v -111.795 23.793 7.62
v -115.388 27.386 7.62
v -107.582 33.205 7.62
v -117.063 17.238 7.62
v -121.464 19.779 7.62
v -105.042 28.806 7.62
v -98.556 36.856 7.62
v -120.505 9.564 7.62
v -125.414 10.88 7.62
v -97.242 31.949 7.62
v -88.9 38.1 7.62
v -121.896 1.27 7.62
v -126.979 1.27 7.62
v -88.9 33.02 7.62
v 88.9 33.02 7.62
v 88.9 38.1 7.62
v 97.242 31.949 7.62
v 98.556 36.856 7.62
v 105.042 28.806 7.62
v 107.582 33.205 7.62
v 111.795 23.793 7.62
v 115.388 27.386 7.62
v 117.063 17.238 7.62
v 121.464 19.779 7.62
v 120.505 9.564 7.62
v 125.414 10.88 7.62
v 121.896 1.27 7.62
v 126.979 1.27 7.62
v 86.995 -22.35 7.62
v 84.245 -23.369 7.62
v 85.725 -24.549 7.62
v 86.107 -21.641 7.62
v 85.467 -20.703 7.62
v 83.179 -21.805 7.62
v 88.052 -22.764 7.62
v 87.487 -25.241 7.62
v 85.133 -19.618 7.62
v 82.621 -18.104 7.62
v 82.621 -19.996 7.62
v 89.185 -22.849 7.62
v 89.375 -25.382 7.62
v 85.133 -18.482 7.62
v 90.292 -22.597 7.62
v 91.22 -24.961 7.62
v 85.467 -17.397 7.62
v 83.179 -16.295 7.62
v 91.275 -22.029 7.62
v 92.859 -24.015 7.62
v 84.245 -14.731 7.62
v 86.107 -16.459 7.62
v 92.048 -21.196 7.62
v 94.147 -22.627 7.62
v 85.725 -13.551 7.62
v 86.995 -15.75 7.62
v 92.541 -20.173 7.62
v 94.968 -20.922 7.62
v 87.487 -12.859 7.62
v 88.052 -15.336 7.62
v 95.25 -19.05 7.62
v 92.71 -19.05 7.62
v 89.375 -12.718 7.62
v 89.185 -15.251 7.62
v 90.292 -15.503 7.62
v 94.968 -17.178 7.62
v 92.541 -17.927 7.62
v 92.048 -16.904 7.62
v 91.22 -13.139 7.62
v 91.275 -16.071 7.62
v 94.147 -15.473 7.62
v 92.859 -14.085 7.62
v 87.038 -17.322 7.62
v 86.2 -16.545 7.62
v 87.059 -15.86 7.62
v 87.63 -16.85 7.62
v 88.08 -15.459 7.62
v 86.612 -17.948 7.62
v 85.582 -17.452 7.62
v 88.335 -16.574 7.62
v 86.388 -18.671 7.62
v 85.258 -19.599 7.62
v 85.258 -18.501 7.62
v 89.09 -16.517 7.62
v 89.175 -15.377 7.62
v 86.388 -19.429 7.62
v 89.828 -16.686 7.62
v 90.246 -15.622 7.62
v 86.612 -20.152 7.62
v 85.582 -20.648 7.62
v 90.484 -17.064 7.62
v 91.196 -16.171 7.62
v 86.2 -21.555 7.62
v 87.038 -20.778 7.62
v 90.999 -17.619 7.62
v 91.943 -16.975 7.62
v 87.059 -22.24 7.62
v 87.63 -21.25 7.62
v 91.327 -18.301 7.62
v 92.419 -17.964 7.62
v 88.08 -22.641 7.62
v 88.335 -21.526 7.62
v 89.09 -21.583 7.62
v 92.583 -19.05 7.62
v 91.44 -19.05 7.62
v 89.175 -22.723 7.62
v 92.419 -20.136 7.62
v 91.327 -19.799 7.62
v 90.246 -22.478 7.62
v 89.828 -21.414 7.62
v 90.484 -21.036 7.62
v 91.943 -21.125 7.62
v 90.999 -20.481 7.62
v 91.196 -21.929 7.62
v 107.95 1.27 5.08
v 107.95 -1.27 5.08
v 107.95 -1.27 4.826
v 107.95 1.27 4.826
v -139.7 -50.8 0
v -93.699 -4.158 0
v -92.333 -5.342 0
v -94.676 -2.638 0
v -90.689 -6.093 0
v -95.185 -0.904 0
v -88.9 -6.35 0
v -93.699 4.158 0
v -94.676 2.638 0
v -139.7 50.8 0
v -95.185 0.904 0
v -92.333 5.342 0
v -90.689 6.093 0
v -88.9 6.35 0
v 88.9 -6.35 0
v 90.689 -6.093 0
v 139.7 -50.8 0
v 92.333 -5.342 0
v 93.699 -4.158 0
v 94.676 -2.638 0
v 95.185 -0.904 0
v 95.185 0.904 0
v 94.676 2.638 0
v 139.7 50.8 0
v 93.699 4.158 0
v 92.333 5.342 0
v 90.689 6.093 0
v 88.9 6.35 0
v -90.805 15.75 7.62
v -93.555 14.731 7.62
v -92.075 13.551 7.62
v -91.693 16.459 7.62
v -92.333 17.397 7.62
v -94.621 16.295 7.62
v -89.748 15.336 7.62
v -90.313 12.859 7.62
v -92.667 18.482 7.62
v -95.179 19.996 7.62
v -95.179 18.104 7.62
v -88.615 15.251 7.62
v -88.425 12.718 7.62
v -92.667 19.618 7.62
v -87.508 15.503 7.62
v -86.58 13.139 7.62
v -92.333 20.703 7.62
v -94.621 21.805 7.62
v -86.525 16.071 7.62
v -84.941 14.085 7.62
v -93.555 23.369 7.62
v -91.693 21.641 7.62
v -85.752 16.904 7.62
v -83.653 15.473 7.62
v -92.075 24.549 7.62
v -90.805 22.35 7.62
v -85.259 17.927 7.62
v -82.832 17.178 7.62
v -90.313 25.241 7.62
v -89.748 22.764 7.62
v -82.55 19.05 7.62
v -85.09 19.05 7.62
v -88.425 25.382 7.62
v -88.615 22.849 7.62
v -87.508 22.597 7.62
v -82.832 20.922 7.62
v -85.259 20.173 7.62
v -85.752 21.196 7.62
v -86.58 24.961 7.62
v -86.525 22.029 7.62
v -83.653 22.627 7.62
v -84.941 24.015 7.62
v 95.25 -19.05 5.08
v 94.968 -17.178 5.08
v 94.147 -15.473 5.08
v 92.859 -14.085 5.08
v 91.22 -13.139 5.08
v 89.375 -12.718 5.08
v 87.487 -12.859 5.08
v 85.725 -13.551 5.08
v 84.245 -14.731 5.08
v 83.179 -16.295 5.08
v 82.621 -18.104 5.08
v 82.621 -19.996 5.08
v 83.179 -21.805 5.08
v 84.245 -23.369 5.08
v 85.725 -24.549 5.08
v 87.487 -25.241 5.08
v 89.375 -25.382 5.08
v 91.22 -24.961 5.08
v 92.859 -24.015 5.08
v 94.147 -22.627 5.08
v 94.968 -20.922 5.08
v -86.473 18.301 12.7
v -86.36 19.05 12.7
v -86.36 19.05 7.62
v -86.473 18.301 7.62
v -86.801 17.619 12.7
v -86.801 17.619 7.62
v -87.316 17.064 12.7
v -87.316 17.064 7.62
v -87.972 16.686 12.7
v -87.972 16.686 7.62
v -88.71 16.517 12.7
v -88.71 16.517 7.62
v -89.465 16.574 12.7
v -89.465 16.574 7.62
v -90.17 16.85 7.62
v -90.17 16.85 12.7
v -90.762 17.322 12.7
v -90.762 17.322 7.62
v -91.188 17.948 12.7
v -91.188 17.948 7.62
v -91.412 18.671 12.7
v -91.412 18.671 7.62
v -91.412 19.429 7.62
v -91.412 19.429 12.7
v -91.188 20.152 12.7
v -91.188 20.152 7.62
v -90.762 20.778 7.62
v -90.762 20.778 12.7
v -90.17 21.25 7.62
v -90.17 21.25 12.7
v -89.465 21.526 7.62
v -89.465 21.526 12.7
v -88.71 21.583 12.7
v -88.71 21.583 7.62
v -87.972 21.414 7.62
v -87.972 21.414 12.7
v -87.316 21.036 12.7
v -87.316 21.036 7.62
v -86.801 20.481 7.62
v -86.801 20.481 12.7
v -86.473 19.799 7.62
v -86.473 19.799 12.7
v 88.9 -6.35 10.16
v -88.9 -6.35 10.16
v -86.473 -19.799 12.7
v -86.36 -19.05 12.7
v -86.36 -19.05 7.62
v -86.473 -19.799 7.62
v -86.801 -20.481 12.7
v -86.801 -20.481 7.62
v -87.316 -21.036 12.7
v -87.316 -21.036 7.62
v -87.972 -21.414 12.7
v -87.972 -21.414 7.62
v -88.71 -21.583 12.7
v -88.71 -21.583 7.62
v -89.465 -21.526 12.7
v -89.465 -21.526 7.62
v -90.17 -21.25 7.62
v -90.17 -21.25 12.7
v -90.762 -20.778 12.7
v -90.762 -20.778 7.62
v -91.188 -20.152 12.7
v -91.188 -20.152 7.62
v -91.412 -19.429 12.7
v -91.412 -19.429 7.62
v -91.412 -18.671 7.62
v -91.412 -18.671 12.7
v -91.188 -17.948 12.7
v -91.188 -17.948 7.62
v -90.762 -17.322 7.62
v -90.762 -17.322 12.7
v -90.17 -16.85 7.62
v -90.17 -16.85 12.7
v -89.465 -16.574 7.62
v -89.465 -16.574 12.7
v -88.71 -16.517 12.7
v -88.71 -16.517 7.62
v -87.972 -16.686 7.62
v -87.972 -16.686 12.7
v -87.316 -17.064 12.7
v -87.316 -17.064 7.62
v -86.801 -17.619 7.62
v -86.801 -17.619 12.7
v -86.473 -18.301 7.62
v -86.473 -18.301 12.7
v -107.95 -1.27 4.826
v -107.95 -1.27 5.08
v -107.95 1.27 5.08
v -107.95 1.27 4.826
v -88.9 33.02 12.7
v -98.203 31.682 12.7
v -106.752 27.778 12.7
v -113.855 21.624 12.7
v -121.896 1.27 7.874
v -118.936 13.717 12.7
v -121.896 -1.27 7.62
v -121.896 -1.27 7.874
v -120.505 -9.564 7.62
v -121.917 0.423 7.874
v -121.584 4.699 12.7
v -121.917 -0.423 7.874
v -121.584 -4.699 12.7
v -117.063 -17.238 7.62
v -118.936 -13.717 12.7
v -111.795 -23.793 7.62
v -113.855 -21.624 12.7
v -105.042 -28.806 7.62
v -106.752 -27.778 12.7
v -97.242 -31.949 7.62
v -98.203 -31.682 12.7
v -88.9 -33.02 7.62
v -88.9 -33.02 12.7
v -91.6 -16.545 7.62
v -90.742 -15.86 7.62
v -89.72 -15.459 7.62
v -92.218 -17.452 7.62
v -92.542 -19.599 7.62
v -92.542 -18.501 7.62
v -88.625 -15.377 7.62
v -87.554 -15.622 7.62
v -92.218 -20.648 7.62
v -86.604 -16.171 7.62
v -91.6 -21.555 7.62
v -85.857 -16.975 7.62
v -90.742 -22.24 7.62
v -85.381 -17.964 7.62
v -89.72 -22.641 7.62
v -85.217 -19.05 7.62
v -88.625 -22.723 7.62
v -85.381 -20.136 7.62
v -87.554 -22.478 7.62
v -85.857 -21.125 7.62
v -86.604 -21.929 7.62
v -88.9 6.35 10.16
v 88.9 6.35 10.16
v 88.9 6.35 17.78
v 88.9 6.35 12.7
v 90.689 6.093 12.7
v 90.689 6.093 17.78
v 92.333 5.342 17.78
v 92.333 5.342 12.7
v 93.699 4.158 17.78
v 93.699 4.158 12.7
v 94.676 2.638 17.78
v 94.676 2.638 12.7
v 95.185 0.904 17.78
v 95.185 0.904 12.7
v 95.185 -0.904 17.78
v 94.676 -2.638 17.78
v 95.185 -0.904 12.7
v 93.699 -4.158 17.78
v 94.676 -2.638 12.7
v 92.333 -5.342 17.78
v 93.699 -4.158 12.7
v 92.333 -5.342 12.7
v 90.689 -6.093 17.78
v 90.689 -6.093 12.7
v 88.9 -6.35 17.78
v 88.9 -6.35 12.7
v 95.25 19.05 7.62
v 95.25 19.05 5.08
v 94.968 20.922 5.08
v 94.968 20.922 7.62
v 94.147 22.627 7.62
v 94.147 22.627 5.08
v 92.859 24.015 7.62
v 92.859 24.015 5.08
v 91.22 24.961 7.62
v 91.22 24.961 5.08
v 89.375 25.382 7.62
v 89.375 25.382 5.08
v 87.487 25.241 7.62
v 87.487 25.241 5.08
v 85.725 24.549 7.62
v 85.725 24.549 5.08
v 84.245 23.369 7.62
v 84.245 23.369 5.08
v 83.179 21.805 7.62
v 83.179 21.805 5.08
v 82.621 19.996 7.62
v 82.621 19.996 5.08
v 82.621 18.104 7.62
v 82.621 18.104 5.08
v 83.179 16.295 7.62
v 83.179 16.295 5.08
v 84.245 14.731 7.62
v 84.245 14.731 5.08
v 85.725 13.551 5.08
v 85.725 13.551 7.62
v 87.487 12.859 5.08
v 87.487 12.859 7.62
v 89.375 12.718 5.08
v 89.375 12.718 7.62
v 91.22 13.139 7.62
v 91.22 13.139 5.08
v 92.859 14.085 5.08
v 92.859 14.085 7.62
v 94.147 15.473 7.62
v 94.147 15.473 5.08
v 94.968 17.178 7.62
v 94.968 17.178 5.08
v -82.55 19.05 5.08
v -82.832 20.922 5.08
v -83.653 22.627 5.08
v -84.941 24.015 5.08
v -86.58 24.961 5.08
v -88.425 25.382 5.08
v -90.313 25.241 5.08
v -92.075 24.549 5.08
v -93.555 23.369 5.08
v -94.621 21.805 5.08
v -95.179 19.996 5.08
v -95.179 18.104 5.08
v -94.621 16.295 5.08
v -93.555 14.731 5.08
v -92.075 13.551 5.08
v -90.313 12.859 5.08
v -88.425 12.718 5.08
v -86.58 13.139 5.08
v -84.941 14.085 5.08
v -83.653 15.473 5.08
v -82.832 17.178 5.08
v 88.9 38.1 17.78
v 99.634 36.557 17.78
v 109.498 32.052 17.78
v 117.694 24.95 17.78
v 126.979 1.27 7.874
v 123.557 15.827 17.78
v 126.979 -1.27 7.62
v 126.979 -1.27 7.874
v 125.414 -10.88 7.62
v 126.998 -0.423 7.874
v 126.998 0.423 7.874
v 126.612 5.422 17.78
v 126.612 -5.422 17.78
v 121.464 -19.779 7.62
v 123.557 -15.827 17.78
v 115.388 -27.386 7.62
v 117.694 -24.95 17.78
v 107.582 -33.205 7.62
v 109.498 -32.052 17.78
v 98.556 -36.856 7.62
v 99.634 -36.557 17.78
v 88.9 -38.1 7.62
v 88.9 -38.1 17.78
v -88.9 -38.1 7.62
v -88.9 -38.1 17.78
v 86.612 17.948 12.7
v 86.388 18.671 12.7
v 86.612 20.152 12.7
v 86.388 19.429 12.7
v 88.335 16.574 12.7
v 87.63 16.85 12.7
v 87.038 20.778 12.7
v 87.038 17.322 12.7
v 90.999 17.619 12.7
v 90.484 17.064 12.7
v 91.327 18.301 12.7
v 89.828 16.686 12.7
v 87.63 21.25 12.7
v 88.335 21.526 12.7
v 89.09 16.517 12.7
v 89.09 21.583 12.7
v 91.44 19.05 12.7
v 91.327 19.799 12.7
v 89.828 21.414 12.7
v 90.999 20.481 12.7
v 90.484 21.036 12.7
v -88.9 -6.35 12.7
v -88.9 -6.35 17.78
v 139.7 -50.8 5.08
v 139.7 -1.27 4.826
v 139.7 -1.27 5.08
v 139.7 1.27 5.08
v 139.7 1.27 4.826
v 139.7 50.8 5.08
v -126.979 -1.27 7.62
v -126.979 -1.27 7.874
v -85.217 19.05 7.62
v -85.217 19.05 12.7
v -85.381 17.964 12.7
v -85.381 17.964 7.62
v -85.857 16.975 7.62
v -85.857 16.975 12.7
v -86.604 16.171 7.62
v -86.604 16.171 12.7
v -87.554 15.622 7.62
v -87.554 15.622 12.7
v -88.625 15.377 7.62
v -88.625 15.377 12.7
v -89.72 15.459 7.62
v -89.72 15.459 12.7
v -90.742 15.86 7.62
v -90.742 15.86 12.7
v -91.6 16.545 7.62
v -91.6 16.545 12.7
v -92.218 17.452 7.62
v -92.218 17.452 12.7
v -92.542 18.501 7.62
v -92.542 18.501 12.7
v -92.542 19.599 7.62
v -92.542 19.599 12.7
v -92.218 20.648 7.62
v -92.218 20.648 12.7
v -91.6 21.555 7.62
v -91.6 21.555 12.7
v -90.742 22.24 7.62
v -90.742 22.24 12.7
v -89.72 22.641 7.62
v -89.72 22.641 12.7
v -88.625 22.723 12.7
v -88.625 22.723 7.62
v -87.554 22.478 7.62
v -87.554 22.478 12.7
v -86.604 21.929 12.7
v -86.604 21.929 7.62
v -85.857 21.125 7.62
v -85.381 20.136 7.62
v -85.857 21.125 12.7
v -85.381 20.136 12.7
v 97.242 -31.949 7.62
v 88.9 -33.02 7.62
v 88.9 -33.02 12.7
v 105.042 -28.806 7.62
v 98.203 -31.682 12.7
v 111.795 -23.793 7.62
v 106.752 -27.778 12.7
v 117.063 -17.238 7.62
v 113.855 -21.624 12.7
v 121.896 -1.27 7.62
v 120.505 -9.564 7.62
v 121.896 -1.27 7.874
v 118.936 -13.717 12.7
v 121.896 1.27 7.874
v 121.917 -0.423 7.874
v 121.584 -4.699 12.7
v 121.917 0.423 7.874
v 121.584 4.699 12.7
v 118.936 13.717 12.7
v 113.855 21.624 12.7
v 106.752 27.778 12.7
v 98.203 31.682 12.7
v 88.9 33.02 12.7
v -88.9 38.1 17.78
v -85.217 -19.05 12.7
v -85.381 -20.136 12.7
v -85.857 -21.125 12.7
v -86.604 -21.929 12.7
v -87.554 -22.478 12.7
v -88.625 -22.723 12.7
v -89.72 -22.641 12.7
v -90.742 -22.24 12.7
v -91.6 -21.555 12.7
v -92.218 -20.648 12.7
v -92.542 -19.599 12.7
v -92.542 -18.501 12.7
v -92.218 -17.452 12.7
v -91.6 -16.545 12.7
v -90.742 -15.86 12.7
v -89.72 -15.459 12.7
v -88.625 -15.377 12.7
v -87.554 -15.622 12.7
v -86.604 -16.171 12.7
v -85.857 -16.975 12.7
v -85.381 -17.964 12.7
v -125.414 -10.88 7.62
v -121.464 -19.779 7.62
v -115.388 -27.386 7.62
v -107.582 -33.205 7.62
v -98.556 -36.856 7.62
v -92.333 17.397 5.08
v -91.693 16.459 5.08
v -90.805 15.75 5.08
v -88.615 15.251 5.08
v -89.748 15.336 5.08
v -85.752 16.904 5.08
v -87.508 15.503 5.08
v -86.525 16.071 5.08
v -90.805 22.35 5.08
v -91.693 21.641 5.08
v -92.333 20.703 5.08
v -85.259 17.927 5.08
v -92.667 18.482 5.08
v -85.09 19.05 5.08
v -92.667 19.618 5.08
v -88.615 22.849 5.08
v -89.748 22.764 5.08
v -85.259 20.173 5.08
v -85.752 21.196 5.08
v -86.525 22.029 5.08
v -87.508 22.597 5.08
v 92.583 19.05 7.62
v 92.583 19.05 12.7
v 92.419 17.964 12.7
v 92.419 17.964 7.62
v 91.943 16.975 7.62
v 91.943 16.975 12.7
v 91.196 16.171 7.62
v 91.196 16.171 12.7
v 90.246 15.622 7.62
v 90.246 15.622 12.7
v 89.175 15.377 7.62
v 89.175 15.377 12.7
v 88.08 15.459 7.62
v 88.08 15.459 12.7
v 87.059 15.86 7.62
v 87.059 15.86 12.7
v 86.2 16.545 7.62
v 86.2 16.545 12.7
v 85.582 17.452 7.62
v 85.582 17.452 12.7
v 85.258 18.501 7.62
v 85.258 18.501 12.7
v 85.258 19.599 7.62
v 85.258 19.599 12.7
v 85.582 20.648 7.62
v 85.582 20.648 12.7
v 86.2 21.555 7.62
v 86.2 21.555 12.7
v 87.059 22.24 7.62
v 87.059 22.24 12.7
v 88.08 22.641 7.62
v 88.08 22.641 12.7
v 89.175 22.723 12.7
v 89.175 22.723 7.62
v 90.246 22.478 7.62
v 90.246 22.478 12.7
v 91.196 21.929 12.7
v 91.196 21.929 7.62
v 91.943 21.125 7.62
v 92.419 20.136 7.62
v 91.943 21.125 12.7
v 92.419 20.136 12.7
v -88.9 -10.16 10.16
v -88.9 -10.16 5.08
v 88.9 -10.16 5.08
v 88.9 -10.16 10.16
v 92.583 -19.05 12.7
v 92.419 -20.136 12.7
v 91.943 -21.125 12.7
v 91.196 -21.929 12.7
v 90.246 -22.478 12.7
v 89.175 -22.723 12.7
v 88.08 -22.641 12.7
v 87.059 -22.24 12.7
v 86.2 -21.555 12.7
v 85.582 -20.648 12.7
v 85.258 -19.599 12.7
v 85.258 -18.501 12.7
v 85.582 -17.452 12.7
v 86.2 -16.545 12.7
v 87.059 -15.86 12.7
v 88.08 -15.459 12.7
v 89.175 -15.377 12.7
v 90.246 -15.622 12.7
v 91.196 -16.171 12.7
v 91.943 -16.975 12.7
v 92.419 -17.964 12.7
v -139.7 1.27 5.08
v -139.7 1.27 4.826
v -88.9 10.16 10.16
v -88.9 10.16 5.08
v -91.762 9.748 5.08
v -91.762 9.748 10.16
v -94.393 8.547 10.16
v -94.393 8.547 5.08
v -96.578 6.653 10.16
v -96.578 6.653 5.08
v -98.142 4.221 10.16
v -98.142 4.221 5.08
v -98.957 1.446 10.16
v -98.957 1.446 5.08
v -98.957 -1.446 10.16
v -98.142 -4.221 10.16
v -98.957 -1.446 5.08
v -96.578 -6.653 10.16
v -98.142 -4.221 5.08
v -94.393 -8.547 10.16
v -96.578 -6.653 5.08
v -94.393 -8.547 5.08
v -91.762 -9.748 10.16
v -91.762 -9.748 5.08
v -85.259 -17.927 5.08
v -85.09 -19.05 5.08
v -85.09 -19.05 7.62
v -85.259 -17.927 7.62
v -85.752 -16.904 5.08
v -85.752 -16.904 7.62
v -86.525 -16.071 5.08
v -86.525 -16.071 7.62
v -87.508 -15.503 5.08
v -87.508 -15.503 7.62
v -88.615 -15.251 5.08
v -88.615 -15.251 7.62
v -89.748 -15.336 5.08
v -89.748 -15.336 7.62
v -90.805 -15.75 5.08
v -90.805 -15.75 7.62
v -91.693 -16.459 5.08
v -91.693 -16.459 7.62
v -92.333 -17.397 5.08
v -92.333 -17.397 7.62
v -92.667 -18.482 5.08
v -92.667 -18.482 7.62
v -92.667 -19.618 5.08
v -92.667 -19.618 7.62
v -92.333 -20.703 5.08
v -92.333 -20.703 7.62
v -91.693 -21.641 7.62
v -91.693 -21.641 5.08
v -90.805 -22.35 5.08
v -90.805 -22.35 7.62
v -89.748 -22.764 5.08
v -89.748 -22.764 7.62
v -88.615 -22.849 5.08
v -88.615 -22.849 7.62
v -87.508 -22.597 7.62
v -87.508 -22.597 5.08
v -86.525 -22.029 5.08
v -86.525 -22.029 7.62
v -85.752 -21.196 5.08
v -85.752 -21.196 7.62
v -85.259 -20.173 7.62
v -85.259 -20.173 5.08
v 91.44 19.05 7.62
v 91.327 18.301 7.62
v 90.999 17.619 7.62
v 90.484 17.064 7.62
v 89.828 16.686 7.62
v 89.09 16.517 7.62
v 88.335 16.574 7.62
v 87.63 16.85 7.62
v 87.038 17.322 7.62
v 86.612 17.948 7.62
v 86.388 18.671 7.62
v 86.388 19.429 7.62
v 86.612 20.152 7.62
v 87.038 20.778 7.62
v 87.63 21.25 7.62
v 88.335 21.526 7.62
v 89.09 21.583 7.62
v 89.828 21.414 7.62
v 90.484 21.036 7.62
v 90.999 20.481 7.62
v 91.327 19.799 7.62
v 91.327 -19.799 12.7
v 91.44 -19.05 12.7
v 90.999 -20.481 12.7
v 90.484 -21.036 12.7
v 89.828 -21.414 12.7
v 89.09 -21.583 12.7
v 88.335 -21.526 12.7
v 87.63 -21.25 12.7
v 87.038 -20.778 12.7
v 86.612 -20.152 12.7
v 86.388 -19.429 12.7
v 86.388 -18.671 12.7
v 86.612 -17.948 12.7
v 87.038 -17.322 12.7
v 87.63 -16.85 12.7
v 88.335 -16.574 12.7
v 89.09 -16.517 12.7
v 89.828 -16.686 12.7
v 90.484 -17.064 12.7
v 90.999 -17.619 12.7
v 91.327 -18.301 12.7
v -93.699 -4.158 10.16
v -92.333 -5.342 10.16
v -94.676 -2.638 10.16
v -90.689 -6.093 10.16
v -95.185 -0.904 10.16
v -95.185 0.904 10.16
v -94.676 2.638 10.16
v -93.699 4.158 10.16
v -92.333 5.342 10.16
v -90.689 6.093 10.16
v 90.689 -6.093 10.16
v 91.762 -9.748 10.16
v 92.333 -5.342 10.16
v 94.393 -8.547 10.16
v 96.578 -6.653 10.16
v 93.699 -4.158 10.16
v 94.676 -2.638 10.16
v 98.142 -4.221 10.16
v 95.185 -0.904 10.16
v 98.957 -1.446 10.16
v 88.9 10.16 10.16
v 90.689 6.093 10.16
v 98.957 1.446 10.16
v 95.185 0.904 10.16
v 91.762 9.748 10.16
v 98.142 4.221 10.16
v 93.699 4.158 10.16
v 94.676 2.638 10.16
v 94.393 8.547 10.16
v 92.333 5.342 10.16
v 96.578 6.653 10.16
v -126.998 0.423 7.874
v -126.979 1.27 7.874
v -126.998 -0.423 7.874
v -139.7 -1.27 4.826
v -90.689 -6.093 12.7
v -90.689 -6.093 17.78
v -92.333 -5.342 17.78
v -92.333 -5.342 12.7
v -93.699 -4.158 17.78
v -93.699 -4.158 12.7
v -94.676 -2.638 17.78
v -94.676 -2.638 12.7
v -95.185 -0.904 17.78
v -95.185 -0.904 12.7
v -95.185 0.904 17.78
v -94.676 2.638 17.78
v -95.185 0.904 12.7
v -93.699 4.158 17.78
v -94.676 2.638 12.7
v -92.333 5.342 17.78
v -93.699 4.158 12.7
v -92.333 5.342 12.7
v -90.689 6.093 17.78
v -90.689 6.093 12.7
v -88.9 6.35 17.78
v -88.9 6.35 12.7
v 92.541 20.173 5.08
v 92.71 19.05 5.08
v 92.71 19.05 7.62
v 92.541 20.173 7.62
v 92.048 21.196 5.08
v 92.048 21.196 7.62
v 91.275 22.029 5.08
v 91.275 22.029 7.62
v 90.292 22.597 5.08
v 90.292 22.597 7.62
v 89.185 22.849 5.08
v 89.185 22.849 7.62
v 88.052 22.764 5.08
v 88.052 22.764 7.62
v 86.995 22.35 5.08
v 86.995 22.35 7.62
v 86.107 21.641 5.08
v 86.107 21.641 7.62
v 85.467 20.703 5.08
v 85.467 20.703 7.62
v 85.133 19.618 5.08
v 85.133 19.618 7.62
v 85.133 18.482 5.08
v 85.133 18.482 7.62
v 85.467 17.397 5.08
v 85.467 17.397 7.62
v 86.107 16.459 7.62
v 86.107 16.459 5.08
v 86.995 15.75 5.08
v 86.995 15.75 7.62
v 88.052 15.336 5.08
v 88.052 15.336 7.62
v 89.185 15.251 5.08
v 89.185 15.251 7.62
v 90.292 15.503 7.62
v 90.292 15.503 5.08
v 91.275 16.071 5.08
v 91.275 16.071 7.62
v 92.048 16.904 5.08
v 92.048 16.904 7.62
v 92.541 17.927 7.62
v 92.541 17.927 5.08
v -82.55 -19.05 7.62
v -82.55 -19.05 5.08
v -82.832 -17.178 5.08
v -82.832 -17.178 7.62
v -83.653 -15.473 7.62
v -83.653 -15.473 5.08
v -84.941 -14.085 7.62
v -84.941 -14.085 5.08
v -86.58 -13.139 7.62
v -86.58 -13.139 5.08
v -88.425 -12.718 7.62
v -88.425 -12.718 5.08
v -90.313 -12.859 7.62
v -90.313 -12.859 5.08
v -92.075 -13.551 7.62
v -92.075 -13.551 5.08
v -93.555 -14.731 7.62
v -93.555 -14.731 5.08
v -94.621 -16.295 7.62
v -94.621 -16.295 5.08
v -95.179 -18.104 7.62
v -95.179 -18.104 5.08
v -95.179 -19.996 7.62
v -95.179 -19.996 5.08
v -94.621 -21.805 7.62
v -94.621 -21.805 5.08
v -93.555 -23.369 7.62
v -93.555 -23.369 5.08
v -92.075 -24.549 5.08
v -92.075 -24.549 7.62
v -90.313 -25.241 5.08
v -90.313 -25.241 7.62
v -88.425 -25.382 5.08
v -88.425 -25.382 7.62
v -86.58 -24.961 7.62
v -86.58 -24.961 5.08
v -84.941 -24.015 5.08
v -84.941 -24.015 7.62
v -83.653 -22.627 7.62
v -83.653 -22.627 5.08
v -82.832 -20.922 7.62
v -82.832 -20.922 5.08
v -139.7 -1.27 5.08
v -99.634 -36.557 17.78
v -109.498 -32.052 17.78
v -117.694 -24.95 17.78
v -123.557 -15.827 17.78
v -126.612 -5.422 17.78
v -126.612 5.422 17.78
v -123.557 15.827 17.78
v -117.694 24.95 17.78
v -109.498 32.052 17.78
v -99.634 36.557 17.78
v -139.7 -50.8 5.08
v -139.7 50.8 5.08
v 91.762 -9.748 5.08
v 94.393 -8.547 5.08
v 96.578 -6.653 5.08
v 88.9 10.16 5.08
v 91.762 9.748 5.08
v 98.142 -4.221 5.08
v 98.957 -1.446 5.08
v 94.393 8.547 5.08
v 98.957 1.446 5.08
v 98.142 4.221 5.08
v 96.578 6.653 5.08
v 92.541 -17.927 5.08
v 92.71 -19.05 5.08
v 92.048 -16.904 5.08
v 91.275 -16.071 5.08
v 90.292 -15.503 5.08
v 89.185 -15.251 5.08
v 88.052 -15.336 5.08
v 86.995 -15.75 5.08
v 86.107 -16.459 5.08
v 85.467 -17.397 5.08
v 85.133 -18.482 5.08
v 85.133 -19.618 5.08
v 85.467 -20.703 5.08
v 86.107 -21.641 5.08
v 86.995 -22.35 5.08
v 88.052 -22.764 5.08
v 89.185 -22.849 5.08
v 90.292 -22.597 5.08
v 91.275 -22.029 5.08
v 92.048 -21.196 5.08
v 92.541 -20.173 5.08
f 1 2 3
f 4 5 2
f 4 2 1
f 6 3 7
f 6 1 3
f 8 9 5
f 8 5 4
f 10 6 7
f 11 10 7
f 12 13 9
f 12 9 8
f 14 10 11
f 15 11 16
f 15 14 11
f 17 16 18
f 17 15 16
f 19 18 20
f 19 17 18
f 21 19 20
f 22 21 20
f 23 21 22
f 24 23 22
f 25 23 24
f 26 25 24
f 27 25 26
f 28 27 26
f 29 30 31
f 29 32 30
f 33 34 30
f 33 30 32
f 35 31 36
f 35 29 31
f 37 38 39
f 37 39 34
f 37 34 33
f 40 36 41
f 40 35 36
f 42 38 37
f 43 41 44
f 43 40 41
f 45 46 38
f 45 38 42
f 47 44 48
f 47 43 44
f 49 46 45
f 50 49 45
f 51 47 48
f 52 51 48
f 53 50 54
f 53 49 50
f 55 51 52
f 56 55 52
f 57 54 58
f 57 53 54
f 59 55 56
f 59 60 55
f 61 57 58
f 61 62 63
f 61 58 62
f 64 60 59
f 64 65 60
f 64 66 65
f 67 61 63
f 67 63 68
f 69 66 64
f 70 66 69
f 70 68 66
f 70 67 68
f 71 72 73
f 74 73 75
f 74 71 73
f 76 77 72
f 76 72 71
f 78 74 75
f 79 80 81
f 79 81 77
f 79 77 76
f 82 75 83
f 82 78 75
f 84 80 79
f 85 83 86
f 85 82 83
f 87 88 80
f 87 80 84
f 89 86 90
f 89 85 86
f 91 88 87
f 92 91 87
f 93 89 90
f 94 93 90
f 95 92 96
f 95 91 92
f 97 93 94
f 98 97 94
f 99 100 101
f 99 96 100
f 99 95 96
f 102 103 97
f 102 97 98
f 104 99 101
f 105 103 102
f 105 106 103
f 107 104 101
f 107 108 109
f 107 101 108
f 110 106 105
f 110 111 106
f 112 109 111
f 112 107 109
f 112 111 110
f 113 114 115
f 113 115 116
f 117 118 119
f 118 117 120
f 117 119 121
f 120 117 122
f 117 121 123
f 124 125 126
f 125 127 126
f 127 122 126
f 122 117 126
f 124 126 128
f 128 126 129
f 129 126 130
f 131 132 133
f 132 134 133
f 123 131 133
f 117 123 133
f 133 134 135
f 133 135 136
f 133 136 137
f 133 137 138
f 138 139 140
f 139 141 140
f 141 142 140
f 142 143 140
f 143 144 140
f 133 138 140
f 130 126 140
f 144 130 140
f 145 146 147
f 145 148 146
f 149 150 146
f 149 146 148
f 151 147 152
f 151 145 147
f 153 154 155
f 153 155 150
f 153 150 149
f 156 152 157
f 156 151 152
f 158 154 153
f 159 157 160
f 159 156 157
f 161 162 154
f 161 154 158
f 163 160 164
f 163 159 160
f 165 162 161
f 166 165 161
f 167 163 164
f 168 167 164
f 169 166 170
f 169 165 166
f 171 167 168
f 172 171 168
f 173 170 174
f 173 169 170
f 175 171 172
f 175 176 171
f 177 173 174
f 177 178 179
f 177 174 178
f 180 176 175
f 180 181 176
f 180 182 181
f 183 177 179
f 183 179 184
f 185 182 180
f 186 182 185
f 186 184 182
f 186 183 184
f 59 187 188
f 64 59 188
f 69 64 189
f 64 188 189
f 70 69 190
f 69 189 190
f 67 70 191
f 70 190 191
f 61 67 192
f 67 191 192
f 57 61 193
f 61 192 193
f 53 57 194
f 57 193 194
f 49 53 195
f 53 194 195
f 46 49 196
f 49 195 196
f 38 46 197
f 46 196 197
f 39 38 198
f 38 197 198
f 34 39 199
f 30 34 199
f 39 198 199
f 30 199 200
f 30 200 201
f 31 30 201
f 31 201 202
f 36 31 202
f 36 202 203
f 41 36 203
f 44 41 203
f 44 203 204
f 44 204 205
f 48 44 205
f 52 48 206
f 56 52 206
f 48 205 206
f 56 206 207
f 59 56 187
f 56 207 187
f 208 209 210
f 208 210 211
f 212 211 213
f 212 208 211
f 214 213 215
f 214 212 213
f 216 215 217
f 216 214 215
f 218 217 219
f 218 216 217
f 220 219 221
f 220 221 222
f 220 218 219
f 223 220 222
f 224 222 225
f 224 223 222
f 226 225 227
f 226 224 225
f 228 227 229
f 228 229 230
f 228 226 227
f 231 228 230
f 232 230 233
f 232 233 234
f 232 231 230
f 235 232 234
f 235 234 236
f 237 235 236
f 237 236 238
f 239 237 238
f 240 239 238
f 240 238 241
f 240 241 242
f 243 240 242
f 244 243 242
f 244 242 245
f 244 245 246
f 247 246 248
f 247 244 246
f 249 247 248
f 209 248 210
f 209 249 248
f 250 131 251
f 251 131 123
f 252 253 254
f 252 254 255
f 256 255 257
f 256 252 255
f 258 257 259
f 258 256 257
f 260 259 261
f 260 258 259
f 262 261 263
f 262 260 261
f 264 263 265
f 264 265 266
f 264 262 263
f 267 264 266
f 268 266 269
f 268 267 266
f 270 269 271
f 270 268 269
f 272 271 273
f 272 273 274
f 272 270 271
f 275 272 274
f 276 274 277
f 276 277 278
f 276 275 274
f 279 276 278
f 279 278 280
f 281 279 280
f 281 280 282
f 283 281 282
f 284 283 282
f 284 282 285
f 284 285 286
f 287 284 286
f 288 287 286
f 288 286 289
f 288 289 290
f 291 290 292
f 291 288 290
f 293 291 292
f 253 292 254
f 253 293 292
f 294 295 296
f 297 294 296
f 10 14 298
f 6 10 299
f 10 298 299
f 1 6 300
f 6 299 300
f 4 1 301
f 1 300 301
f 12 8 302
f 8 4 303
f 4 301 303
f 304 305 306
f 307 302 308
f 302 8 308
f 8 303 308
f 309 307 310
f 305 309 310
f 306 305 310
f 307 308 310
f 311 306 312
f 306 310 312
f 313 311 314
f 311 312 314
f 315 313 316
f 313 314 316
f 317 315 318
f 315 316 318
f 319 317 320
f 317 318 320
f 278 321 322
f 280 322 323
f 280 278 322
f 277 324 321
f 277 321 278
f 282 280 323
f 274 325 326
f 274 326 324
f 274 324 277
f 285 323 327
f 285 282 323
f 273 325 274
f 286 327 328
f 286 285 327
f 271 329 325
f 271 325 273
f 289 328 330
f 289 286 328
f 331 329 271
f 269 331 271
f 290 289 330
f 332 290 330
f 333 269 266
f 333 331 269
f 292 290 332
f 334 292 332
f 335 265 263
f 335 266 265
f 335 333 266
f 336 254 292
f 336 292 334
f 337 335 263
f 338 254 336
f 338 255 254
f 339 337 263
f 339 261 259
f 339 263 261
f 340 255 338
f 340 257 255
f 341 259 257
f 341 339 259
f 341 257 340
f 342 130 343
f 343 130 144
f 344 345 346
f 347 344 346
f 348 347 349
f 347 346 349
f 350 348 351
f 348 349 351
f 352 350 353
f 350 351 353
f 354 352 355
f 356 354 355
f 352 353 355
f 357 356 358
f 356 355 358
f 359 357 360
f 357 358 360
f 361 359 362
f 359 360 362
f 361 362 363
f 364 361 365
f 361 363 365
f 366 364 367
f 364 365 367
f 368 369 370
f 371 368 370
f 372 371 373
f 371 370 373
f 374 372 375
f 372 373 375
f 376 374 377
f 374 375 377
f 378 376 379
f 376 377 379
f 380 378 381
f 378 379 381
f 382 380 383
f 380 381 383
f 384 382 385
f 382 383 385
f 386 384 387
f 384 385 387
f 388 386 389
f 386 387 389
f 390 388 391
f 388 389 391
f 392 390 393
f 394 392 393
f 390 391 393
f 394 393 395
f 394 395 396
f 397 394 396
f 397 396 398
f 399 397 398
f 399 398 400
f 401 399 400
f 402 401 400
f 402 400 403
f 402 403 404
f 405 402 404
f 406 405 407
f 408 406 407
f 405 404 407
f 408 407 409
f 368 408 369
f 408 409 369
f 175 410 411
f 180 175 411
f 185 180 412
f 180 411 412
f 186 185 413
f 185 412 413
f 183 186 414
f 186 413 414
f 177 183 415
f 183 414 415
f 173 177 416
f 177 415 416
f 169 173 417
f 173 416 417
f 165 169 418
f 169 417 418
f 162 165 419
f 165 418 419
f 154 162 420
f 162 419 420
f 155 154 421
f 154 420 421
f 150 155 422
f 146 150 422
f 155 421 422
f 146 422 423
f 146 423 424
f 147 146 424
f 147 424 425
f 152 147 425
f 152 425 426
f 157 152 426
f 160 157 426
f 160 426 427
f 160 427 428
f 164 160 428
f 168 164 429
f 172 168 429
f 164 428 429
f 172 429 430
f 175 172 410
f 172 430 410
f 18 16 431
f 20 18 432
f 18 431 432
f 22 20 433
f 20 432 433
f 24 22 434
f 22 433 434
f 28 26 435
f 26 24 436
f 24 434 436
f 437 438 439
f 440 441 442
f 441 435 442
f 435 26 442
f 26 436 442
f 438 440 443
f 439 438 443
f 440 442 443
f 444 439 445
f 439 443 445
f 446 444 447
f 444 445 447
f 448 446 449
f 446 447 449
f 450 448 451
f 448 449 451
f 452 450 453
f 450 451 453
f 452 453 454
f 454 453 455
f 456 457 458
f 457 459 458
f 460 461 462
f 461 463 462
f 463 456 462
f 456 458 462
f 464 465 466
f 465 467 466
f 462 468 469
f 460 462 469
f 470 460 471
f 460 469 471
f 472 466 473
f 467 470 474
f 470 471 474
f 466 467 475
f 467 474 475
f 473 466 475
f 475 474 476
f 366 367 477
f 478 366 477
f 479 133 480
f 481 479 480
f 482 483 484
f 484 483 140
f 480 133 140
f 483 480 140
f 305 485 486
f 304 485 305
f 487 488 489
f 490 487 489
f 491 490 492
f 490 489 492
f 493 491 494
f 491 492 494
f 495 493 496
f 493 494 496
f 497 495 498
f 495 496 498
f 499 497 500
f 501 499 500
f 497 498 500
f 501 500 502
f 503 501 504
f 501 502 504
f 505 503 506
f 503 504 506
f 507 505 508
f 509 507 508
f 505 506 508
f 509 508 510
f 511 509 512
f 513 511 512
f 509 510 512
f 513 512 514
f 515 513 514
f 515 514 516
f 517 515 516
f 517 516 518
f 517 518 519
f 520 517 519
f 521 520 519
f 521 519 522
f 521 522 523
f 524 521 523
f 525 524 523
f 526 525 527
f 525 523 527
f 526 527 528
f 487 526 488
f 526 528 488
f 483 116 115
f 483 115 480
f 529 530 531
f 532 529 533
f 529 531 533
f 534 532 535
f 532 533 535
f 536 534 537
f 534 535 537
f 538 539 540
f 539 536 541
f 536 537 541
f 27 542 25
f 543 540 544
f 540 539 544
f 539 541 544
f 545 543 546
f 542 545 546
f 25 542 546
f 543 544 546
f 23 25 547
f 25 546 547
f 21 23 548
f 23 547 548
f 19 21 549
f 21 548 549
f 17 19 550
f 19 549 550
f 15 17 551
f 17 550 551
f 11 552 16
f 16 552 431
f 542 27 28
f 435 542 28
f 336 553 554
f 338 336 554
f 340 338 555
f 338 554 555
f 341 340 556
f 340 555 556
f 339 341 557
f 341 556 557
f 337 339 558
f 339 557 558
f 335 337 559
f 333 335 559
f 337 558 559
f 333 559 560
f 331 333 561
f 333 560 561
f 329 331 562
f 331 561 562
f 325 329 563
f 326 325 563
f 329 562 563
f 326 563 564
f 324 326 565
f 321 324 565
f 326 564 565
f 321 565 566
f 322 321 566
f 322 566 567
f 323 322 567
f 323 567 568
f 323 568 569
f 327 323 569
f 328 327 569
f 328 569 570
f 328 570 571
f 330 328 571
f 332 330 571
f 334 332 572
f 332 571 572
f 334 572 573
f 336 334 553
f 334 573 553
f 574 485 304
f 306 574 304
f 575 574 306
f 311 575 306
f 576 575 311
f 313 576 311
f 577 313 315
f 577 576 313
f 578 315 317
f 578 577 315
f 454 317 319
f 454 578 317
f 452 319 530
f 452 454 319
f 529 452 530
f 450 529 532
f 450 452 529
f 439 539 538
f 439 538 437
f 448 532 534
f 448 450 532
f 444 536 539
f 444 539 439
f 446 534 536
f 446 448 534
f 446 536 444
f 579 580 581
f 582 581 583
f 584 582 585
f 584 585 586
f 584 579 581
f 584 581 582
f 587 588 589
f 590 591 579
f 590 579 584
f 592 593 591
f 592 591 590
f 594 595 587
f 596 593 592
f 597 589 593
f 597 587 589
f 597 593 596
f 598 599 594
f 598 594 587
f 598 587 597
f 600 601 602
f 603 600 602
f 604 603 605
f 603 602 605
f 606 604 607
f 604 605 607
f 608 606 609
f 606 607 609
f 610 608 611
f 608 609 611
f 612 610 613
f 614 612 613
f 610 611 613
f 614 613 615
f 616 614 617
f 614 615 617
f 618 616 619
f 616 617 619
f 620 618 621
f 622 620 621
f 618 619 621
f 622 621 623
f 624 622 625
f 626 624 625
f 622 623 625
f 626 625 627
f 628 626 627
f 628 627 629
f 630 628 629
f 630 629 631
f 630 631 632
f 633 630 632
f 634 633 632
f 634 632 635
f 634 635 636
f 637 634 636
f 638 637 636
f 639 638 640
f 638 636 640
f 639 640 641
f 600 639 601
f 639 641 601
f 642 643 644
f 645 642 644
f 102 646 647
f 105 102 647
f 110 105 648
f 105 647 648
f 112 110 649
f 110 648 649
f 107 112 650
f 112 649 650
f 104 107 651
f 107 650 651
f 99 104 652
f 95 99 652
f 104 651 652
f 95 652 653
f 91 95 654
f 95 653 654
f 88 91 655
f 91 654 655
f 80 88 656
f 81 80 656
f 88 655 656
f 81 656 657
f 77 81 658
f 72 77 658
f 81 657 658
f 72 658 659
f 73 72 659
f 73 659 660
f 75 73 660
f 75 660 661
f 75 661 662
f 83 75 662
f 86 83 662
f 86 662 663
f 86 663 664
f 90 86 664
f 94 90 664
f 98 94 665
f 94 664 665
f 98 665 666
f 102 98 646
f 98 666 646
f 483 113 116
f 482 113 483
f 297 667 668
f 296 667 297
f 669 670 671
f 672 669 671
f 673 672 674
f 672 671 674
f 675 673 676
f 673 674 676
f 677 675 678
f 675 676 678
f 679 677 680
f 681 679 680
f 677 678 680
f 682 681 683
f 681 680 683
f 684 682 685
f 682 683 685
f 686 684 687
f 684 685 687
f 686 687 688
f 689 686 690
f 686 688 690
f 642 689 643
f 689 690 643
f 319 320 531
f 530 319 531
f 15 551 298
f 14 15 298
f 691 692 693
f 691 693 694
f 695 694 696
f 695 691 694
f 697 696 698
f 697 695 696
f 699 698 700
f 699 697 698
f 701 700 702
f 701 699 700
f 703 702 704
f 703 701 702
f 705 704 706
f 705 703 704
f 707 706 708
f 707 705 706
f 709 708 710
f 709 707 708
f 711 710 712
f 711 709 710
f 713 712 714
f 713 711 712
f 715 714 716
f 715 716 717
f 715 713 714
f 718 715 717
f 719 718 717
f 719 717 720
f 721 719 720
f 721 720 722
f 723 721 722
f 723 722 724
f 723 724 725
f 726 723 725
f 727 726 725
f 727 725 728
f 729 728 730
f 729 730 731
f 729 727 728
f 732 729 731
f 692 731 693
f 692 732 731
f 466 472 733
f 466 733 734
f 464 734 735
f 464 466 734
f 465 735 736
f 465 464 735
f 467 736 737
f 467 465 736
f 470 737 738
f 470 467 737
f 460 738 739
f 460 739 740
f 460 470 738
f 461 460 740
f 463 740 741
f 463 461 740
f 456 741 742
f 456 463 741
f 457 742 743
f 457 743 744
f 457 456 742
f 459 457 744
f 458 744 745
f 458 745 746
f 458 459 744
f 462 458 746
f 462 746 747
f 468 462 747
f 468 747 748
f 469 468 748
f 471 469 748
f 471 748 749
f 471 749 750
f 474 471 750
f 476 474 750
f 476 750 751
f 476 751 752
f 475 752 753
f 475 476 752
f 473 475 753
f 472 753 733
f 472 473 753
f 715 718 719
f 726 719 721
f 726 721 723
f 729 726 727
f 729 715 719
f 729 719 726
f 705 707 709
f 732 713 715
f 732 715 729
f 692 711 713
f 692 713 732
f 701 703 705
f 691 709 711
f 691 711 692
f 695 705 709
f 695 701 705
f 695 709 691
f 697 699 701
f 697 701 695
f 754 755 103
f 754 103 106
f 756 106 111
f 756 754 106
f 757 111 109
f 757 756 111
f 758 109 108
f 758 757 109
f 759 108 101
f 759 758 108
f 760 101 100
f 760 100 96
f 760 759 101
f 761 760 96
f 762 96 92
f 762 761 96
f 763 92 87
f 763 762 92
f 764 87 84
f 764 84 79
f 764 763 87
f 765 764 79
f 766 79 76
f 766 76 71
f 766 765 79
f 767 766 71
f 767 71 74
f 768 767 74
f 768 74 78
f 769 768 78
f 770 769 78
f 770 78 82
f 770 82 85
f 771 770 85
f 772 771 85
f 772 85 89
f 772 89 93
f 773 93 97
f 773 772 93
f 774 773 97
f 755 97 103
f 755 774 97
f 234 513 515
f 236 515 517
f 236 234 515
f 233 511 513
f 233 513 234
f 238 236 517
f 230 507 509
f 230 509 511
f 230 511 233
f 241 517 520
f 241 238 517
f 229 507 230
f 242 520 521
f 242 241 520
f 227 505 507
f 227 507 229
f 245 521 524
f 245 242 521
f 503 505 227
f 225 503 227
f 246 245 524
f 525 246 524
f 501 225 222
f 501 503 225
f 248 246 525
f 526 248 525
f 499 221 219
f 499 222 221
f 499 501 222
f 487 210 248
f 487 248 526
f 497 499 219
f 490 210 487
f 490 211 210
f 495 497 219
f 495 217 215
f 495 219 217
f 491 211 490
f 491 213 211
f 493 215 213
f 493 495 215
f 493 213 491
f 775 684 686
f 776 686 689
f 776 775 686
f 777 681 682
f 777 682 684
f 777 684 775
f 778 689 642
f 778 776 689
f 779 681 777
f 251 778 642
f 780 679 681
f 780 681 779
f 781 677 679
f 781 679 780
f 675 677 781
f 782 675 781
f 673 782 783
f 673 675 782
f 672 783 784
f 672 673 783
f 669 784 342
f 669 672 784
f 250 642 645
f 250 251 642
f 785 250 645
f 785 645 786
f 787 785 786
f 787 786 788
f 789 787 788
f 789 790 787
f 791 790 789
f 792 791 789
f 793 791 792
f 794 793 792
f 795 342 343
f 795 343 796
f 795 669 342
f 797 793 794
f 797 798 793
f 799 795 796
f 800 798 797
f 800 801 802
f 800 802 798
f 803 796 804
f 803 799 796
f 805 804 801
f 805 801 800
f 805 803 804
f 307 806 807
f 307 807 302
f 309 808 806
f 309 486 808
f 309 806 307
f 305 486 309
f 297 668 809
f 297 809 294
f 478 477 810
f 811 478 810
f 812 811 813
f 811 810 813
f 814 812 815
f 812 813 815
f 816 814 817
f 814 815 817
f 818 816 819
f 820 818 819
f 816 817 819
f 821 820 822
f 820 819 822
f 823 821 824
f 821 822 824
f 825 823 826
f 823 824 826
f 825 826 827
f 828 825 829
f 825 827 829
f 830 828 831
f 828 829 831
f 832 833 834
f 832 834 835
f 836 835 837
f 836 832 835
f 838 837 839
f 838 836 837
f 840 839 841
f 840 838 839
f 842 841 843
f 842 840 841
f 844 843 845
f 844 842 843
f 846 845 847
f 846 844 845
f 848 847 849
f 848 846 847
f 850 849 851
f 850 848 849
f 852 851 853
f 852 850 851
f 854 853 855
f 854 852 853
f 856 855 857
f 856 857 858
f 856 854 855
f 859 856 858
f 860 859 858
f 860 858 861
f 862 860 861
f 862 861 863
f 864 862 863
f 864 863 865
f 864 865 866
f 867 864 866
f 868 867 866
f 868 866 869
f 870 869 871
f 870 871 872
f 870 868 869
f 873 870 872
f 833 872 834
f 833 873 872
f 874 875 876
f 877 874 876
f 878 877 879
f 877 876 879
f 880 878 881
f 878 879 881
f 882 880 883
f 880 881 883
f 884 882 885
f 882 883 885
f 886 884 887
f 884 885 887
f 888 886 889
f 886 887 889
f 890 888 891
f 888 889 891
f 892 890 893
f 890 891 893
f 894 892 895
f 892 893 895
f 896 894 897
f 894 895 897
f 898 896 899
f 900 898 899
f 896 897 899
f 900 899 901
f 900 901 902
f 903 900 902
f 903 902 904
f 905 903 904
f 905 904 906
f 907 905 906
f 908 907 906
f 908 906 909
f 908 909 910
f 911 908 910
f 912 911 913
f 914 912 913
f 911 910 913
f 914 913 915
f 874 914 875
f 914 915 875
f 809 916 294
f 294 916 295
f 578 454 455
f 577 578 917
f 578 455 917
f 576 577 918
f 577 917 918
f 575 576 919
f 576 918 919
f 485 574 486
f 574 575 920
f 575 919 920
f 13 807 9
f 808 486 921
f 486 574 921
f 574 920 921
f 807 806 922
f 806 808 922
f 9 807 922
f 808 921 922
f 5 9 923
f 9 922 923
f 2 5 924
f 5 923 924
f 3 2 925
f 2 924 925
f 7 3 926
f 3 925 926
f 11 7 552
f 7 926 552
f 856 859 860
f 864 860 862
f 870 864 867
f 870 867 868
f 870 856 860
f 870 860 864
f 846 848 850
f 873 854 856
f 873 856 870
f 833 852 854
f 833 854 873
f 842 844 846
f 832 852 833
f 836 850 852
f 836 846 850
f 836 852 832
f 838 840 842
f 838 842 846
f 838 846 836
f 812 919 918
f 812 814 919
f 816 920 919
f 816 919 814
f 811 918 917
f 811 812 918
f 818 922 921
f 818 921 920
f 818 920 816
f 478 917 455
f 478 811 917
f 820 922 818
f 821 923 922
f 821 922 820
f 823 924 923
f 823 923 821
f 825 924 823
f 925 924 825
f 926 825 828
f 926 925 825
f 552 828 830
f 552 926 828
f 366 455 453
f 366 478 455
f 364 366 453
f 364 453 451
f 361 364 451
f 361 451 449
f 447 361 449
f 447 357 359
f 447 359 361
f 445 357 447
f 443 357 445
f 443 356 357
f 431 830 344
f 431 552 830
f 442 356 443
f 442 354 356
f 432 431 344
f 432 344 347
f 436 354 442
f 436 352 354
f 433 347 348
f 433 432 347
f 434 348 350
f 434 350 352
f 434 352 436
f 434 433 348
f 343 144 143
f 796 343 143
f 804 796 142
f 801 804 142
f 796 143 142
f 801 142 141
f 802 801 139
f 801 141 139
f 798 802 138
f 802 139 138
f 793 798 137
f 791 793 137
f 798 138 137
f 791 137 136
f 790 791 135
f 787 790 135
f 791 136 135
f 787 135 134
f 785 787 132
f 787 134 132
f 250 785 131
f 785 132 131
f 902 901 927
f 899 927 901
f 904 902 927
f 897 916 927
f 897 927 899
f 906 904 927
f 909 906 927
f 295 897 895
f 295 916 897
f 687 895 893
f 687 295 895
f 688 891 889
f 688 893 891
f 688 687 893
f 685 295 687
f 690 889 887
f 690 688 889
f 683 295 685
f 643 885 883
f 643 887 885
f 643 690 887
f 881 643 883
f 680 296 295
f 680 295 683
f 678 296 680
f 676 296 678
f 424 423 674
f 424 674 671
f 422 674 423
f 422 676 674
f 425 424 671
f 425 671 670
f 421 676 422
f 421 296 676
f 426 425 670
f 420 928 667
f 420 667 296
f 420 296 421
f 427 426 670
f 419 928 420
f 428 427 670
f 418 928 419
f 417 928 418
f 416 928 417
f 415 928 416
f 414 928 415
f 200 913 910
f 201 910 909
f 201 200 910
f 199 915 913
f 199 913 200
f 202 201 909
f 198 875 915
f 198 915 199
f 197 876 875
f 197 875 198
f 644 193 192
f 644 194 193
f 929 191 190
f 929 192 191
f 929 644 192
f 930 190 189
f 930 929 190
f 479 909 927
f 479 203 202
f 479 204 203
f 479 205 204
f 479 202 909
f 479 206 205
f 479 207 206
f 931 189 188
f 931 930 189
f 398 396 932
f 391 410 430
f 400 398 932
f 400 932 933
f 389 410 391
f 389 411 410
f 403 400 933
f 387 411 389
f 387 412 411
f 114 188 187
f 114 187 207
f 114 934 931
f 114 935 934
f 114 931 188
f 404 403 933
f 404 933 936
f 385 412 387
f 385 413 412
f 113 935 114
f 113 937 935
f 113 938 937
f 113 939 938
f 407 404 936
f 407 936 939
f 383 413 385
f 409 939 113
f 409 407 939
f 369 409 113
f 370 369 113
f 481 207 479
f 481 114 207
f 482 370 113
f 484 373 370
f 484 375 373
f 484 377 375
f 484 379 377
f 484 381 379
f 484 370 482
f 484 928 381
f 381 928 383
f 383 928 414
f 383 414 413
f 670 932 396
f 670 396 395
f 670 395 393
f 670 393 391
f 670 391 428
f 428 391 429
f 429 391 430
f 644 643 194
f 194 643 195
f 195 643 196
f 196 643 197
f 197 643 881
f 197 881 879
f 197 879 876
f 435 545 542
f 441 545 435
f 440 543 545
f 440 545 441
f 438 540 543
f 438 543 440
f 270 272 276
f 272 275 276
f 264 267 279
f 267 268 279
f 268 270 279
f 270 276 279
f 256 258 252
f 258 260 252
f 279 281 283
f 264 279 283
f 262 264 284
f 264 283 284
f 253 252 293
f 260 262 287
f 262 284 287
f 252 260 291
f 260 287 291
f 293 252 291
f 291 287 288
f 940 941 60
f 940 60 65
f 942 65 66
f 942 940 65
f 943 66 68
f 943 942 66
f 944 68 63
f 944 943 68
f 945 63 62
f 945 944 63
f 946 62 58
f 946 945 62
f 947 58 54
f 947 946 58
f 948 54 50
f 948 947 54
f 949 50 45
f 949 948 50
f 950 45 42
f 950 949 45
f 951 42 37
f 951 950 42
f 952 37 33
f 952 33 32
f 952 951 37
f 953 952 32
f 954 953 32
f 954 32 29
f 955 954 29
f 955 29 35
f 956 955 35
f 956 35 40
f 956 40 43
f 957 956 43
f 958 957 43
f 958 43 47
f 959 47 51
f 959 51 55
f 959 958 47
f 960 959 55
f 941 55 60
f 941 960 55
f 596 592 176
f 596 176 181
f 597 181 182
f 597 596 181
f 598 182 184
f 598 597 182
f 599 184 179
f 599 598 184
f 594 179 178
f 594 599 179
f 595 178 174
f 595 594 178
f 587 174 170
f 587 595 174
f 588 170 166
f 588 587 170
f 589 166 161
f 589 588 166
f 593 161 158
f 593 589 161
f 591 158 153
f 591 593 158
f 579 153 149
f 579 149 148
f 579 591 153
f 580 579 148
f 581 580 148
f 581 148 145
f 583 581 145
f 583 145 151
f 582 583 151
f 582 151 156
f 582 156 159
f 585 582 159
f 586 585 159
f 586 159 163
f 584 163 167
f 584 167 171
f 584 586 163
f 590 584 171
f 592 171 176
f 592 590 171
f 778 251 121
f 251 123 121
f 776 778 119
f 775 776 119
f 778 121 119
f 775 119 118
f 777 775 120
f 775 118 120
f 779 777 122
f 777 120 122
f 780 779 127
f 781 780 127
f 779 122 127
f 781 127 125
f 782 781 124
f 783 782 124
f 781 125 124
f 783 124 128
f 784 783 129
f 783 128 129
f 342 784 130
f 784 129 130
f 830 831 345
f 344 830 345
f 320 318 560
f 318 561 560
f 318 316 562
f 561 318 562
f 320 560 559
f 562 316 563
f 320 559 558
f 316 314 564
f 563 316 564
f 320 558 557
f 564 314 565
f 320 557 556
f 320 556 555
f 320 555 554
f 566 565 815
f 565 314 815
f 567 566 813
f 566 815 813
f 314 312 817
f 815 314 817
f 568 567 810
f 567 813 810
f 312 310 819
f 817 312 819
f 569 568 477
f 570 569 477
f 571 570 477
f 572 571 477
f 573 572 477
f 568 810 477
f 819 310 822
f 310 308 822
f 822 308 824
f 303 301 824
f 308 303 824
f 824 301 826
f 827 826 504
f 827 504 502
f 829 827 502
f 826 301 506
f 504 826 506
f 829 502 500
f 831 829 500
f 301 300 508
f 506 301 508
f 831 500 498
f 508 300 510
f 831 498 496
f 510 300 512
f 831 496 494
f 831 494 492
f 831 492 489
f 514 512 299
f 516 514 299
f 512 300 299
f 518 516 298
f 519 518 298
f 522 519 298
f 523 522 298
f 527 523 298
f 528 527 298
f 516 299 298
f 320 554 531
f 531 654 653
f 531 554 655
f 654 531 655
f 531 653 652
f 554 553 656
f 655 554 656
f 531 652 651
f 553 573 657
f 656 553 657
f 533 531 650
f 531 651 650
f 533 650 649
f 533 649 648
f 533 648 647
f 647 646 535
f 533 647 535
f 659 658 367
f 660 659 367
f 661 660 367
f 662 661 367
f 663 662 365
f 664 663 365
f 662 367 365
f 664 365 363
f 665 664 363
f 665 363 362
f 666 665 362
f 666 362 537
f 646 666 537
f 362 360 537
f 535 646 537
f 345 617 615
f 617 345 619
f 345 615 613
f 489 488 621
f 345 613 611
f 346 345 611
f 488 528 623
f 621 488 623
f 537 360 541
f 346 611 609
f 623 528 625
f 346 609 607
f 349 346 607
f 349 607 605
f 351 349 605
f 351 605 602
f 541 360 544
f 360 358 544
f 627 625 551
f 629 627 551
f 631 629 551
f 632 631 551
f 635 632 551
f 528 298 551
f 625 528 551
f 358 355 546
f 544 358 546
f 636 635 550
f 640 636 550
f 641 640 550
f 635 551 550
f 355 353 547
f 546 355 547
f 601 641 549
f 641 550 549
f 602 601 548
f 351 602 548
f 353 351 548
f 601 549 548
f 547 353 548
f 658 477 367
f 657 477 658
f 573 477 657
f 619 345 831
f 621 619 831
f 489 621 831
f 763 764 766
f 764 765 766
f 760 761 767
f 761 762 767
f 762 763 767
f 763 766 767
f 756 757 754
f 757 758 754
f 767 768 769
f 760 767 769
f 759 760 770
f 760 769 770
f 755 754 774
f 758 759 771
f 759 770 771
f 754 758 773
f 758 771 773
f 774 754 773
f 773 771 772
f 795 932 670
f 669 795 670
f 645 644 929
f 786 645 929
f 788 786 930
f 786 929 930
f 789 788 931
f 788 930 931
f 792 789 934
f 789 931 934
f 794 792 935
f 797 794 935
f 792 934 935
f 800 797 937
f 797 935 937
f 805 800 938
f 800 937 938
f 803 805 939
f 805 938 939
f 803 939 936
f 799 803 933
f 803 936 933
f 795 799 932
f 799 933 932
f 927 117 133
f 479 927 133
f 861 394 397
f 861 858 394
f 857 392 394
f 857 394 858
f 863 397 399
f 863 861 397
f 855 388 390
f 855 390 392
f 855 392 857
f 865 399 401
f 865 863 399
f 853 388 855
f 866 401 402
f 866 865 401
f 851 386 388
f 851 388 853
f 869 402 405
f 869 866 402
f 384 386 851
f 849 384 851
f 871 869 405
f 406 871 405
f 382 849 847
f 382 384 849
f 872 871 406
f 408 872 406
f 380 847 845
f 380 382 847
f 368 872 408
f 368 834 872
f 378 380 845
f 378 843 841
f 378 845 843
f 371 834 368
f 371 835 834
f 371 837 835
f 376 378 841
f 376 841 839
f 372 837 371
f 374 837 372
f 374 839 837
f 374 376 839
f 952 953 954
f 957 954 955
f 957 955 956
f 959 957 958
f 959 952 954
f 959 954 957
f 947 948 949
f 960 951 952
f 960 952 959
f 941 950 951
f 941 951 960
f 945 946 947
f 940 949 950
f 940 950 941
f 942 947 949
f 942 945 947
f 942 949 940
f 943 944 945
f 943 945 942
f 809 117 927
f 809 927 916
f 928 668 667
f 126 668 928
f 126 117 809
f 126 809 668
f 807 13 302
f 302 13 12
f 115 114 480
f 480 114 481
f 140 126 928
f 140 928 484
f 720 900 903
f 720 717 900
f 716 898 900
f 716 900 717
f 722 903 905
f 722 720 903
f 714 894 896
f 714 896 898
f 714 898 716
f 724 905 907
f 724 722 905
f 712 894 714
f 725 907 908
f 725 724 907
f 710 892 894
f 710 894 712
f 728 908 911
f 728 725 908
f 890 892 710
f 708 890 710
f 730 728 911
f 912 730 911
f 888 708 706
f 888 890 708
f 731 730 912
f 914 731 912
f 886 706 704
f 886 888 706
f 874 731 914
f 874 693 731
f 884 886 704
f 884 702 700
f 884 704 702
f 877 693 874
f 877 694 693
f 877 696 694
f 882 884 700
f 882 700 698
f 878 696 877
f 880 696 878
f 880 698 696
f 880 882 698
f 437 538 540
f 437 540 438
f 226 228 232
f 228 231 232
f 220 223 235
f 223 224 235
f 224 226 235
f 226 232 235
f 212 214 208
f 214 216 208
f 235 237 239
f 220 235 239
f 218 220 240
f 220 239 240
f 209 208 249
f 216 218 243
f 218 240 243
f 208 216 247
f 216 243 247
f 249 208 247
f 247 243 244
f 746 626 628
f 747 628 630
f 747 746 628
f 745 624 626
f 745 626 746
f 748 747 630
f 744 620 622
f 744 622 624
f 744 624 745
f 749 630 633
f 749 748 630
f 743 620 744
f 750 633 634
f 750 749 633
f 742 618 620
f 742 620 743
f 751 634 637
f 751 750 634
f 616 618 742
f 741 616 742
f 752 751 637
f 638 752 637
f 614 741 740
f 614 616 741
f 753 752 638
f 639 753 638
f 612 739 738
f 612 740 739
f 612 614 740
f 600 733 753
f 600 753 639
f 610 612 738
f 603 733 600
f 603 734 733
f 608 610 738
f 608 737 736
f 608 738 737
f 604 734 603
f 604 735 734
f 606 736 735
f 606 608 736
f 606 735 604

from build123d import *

# Parameters (mm, degrees)
F0_W      = 279.4
F0_H      = 101.6
F1_DEPTH  = 5.08
F3_DEPTH  = 5.081
F5_DEPTH  = 5.08
F8_DEPTH  = 5.08
F10_DEPTH = 5.08
F11_R     = 6.35
F11_R_2   = 3.81
F12_DEPTH = 2.54
F13_R     = 3.683
F13_R_2   = 2.54
F14_DEPTH = 5.08
F15_W     = 31.75
F15_H     = 2.54
F16_DEPTH = 0.254
F17_W     = 6.35
F17_H     = 2.54
F18_DEPTH = 0.254


with BuildPart() as f1:
    # F0 (on Top) → F1 (new body)
    with BuildSketch(Plane.XY):
        Rectangle(F0_W, F0_H)
    extrude(amount=F1_DEPTH)

    # F2 (on face) → F3 (cut, through all)
    with BuildSketch(Plane.XY.offset(5.08)):
        with BuildLine():
            ThreePointArc((-88.9, 6.35), (-95.25, 0), (-88.9, -6.35))
            Line((-88.9, -6.35), (88.9, -6.35))
            ThreePointArc((88.9, -6.35), (95.25, 0), (88.9, 6.35))
            Line((88.9, 6.35), (-88.9, 6.35))
        make_face()
    extrude(amount=-F3_DEPTH, mode=Mode.SUBTRACT)

    # F4 (on face) → F5 (join)
    with BuildSketch(Plane.XY.offset(5.08)):
        with BuildLine():
            Line((88.9, 10.16), (-88.9, 10.16))
            ThreePointArc((-88.9, 10.16), (-99.06, 0), (-88.9, -10.16))
            Line((-88.9, -10.16), (88.9, -10.16))
            ThreePointArc((88.9, -10.16), (99.06, 0), (88.9, 10.16))
        make_face()
        with BuildLine():
            ThreePointArc((-88.9, -6.35), (-95.25, 0), (-88.9, 6.35))
            Line((-88.9, 6.35), (88.9, 6.35))
            ThreePointArc((88.9, 6.35), (95.25, 0), (88.9, -6.35))
            Line((88.9, -6.35), (-88.9, -6.35))
        make_face(mode=Mode.SUBTRACT)
    extrude(amount=F5_DEPTH)

    # F11 (on face) → F12 (join)
    with BuildSketch(Plane.XY.offset(5.08)):
        with Locations((-88.9, -19.05)):
            Circle(F11_R)
        with Locations((-88.9, -19.05)):
            Circle(F11_R_2, mode=Mode.SUBTRACT)
        with Locations((-88.9, 19.05)):
            Circle(F11_R)
        with Locations((-88.9, 19.05)):
            Circle(F11_R_2, mode=Mode.SUBTRACT)
        with Locations((88.9, -19.05)):
            Circle(F11_R)
        with Locations((88.9, -19.05)):
            Circle(F11_R_2, mode=Mode.SUBTRACT)
        with Locations((88.9, 19.05)):
            Circle(F11_R)
        with Locations((88.9, 19.05)):
            Circle(F11_R_2, mode=Mode.SUBTRACT)
    extrude(amount=F12_DEPTH)

    # F15 (on face) → F16 (cut)
    with BuildSketch(Plane.XY.offset(5.08)):
        with Locations((-123.825, 0)):
            Rectangle(F15_W, F15_H)
        with Locations((123.825, 0)):
            Rectangle(F15_W, F15_H)
    extrude(amount=-F16_DEPTH, mode=Mode.SUBTRACT)


with BuildPart() as f8:
    # F7 (on offset) → F8 (new body)
    with BuildSketch(Plane.XY.offset(12.7)):
        with BuildLine():
            Line((88.9, 38.1), (-88.9, 38.1))
            ThreePointArc((-88.9, 38.1), (-127, 0), (-88.9, -38.1))
            Line((-88.9, -38.1), (88.9, -38.1))
            ThreePointArc((88.9, -38.1), (127, 0), (88.9, 38.1))
        make_face()
        with BuildLine():
            ThreePointArc((-88.9, -6.35), (-95.25, 0), (-88.9, 6.35))
            Line((-88.9, 6.35), (88.9, 6.35))
            ThreePointArc((88.9, 6.35), (95.25, 0), (88.9, -6.35))
            Line((88.9, -6.35), (-88.9, -6.35))
        make_face(mode=Mode.SUBTRACT)
    extrude(amount=F8_DEPTH)

    # F9 (on face) → F10 (join)
    with BuildSketch(Plane(origin=(0, 0, 12.7), x_dir=(1, 0, 0), z_dir=(0, 0, -1))):
        with BuildLine():
            Line((88.9, 38.1), (-88.9, 38.1))
            ThreePointArc((-88.9, 38.1), (-127, 0), (-88.9, -38.1))
            Line((-88.9, -38.1), (88.9, -38.1))
            ThreePointArc((88.9, -38.1), (127, 0), (88.9, 38.1))
        make_face()
        with BuildLine():
            ThreePointArc((-88.9, -33.02), (-121.92, 0), (-88.9, 33.02))
            Line((-88.9, 33.02), (88.9, 33.02))
            ThreePointArc((88.9, 33.02), (121.92, 0), (88.9, -33.02))
            Line((88.9, -33.02), (-88.9, -33.02))
        make_face(mode=Mode.SUBTRACT)
    extrude(amount=F10_DEPTH)

    # F13 (on face) → F14 (join)
    with BuildSketch(Plane(origin=(0, 0, 12.7), x_dir=(1, 0, 0), z_dir=(0, 0, -1))):
        with Locations((-88.9, -19.05)):
            Circle(F13_R)
        with Locations((-88.9, -19.05)):
            Circle(F13_R_2, mode=Mode.SUBTRACT)
        with Locations((-88.9, 19.05)):
            Circle(F13_R)
        with Locations((-88.9, 19.05)):
            Circle(F13_R_2, mode=Mode.SUBTRACT)
        with Locations((88.9, -19.05)):
            Circle(F13_R)
        with Locations((88.9, -19.05)):
            Circle(F13_R_2, mode=Mode.SUBTRACT)
        with Locations((88.9, 19.05)):
            Circle(F13_R)
        with Locations((88.9, 19.05)):
            Circle(F13_R_2, mode=Mode.SUBTRACT)
    extrude(amount=F14_DEPTH)

    # F17 (on face) → F18 (cut)
    with BuildSketch(Plane(origin=(0, 0, 7.62), x_dir=(1, 0, 0), z_dir=(0, 0, -1))):
        with Locations((-124.46, 0)):
            Rectangle(F17_W, F17_H)
        with Locations((124.46, 0)):
            Rectangle(F17_W, F17_H)
    extrude(amount=-F18_DEPTH, mode=Mode.SUBTRACT)


solid = Compound([f1.part, f8.part])
